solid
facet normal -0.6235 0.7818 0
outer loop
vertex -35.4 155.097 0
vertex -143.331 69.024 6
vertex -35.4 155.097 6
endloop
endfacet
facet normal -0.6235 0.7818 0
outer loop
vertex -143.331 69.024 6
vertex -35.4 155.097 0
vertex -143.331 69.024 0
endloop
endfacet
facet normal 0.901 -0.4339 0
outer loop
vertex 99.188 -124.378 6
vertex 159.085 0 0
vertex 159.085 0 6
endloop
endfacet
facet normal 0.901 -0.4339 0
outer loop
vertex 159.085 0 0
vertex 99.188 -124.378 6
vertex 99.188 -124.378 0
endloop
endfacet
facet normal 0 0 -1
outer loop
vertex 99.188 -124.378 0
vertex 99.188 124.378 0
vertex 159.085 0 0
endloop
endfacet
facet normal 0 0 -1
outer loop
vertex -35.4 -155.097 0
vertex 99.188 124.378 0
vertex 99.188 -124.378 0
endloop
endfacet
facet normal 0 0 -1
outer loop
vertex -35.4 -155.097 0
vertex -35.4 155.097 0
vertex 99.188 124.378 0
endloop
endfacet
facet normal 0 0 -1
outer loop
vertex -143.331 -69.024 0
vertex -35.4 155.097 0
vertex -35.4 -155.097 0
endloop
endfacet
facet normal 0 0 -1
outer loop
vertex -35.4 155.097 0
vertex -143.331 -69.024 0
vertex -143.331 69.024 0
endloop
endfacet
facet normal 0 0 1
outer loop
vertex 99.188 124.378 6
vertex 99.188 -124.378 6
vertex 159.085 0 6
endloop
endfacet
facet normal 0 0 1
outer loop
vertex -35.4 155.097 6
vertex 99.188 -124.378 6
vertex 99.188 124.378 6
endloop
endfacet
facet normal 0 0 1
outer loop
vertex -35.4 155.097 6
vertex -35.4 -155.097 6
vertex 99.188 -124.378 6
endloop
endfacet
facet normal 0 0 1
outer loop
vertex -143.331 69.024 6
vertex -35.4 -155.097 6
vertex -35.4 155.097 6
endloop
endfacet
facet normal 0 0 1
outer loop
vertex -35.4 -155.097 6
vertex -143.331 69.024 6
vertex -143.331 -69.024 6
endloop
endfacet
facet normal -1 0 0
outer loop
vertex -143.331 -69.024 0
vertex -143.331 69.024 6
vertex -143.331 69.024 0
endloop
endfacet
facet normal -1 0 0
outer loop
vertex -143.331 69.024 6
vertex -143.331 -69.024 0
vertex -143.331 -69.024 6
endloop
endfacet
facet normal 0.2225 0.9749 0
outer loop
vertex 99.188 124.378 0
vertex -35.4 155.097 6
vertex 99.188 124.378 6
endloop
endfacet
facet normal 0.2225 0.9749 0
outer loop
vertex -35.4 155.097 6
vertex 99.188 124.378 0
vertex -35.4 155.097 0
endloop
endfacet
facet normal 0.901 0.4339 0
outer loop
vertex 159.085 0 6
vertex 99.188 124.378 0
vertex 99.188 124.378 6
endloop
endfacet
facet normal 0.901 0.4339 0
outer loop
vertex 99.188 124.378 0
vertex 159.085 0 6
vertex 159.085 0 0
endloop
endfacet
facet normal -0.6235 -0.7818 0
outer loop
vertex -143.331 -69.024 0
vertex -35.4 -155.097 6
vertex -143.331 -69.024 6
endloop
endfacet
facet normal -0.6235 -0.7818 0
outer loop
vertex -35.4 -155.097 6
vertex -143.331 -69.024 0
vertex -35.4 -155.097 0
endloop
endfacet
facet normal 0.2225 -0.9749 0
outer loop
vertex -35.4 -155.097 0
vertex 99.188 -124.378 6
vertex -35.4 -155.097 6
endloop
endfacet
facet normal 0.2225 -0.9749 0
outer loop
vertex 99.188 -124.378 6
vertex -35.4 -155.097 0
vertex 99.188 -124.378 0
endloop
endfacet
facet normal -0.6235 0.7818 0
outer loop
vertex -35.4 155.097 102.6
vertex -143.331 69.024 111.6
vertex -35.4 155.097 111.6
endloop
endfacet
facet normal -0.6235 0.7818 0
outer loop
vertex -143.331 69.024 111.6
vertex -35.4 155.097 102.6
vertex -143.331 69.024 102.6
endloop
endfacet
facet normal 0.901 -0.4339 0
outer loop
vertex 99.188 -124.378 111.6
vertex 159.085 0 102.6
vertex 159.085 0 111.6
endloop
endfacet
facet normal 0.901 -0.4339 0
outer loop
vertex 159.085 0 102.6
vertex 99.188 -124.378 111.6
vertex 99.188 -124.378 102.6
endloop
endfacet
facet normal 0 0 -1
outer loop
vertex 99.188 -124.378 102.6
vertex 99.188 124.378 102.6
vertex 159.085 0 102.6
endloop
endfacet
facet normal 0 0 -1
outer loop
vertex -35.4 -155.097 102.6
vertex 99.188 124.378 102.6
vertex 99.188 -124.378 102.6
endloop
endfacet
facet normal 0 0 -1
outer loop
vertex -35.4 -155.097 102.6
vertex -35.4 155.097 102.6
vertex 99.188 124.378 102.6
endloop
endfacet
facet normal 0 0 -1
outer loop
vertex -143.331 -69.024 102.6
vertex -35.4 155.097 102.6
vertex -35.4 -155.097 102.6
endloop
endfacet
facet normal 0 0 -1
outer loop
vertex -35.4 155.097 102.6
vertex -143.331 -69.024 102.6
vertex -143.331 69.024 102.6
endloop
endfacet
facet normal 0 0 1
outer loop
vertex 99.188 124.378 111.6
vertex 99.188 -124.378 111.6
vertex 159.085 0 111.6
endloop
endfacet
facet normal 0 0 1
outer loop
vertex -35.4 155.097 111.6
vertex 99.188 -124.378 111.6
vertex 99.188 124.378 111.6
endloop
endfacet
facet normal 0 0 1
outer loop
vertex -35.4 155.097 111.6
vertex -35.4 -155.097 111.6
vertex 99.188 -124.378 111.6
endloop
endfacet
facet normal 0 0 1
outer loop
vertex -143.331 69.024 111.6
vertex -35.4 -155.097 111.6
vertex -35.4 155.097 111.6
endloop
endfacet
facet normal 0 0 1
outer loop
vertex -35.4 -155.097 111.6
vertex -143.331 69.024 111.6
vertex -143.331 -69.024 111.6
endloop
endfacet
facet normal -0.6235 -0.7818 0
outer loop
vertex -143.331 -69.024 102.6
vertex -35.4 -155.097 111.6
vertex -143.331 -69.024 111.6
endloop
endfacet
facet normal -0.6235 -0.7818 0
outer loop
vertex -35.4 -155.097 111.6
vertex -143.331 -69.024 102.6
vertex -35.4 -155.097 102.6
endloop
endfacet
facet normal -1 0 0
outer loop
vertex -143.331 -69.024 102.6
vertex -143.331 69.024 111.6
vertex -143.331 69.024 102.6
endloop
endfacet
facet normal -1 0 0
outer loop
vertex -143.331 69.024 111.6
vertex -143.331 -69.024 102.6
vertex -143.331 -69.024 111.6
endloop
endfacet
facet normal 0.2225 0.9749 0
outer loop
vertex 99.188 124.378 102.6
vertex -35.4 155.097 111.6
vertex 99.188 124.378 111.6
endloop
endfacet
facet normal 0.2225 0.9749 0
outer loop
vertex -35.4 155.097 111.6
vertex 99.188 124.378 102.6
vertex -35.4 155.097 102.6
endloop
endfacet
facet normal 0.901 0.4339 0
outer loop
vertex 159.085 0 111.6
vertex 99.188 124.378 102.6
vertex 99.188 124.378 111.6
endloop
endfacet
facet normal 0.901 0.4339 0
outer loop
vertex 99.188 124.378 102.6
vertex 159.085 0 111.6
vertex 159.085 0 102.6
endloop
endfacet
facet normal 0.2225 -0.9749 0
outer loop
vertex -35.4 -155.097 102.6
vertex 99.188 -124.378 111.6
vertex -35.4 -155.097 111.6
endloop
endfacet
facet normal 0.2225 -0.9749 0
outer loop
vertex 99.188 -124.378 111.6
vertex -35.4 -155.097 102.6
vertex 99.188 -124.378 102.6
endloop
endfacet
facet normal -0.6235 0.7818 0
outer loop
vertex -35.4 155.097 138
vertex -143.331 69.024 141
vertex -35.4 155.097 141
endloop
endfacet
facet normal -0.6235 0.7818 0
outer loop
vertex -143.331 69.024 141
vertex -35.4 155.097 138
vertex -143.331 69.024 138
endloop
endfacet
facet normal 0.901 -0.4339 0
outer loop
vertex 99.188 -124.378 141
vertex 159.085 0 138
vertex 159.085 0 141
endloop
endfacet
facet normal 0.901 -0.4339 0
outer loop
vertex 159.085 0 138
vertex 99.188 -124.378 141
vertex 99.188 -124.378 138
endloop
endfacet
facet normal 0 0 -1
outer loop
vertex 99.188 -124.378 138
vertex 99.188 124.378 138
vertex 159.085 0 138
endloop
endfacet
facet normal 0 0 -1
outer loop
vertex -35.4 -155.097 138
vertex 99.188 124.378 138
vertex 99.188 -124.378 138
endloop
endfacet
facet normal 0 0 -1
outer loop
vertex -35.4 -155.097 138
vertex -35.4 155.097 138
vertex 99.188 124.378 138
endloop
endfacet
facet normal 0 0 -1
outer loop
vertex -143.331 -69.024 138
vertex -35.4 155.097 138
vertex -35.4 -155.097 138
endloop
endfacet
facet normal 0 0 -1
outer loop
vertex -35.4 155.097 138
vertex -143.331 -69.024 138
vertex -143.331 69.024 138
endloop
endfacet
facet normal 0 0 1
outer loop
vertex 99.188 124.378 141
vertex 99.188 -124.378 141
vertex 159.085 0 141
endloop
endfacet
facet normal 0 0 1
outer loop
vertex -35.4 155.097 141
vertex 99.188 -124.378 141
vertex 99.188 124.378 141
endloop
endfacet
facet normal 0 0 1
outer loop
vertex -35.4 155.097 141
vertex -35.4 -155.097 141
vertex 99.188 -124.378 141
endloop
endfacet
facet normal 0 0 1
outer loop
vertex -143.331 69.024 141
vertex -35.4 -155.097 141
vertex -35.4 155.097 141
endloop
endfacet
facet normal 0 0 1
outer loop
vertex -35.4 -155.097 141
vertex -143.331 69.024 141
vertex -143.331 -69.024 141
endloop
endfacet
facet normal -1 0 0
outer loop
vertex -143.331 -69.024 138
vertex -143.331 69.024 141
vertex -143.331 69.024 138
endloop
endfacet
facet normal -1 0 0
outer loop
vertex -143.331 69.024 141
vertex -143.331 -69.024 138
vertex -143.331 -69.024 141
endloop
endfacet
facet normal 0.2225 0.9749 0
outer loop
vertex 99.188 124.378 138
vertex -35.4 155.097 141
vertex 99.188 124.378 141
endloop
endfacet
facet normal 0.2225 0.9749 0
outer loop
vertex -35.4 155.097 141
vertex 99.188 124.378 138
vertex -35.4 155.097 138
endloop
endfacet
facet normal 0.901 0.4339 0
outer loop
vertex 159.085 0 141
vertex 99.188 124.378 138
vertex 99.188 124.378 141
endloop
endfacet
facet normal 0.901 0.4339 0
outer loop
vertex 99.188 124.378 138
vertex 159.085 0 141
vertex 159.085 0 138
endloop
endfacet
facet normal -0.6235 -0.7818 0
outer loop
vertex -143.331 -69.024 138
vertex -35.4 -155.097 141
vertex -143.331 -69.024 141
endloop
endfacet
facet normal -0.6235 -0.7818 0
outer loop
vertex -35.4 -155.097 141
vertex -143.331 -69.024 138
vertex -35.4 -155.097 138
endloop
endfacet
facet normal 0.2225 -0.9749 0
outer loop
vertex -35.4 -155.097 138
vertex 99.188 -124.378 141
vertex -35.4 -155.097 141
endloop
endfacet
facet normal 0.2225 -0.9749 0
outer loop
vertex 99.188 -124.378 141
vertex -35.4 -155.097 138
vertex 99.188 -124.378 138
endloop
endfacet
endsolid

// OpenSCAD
// file: components/tier.scad
/**
 * The bottom most part of the project.
 */

include <../utils/values.scad>;

module pBase(side, center=true, err=true) {
    r=(side/2)/sin(360/14);
    translate(center ? [0, 0, 0] : [r, r, 0]) circle(r=r - (err ? 0.5 : 0.0), $fn=7);
}

module base(side, thickness, center=true) {
    linear_extrude(height=thickness) pBase(side, center=center, err=false);
}

module pMid(side, center=true, err=true) {
    r=(side/2)/sin(360/14);
    translate(center ? [0, 0, 0] : [r, r, 0]) circle(r=r - (err ? 0.5 : 0.0), $fn=7);
}

module mid(side, thickness, center=true) {
    linear_extrude(height=thickness) pMid(side, center=center, err=false);
}

module pTop(side, center=true, err=true) {
    r=(side/2)/sin(360/14);
    translate(center ? [0, 0, 0] : [r, r, 0]) circle(r=r - (err ? 0.5 : 0.0), $fn=7);
}

module top(side, thickness, center=true) {
    linear_extrude(height=thickness) pTop(side, center=center, err=false);
}
// file: utils/values.scad
/**
 * Project dimensions
 */

SIDES = 7.0;
aSPOKE = 360.0/SIDES;
aSIDE = 180.0 - aSPOKE;

thSPOKE = 6.0;
thBASE = 6.0;
thMID = 9.0;
thTOP = 3.0;
thPAD = 18.0;
thPLATE = 3.0;

lEURO = 128.5;
lSIDE = lEURO + 12*sin(aSPOKE/2)/sin(aSIDE) + 2*thPLATE*tan(aSPOKE/2);

hHP = 5.08;
hLOWER = 20*hHP + 1.0;
hUPPER = 5*hHP + 1.0;

//Explosion parameter
EX = 1.0;
// main file
/**
 * Entire project as assembled
 */

include <./utils/values.scad>;

use <./components/tier.scad>;

base(lSIDE, thBASE);
translate([0, 0, hLOWER*EX]) mid(lSIDE, thMID);
translate([0, 0, (hLOWER + hUPPER + thMID)*EX]) top(lSIDE, thTOP);
